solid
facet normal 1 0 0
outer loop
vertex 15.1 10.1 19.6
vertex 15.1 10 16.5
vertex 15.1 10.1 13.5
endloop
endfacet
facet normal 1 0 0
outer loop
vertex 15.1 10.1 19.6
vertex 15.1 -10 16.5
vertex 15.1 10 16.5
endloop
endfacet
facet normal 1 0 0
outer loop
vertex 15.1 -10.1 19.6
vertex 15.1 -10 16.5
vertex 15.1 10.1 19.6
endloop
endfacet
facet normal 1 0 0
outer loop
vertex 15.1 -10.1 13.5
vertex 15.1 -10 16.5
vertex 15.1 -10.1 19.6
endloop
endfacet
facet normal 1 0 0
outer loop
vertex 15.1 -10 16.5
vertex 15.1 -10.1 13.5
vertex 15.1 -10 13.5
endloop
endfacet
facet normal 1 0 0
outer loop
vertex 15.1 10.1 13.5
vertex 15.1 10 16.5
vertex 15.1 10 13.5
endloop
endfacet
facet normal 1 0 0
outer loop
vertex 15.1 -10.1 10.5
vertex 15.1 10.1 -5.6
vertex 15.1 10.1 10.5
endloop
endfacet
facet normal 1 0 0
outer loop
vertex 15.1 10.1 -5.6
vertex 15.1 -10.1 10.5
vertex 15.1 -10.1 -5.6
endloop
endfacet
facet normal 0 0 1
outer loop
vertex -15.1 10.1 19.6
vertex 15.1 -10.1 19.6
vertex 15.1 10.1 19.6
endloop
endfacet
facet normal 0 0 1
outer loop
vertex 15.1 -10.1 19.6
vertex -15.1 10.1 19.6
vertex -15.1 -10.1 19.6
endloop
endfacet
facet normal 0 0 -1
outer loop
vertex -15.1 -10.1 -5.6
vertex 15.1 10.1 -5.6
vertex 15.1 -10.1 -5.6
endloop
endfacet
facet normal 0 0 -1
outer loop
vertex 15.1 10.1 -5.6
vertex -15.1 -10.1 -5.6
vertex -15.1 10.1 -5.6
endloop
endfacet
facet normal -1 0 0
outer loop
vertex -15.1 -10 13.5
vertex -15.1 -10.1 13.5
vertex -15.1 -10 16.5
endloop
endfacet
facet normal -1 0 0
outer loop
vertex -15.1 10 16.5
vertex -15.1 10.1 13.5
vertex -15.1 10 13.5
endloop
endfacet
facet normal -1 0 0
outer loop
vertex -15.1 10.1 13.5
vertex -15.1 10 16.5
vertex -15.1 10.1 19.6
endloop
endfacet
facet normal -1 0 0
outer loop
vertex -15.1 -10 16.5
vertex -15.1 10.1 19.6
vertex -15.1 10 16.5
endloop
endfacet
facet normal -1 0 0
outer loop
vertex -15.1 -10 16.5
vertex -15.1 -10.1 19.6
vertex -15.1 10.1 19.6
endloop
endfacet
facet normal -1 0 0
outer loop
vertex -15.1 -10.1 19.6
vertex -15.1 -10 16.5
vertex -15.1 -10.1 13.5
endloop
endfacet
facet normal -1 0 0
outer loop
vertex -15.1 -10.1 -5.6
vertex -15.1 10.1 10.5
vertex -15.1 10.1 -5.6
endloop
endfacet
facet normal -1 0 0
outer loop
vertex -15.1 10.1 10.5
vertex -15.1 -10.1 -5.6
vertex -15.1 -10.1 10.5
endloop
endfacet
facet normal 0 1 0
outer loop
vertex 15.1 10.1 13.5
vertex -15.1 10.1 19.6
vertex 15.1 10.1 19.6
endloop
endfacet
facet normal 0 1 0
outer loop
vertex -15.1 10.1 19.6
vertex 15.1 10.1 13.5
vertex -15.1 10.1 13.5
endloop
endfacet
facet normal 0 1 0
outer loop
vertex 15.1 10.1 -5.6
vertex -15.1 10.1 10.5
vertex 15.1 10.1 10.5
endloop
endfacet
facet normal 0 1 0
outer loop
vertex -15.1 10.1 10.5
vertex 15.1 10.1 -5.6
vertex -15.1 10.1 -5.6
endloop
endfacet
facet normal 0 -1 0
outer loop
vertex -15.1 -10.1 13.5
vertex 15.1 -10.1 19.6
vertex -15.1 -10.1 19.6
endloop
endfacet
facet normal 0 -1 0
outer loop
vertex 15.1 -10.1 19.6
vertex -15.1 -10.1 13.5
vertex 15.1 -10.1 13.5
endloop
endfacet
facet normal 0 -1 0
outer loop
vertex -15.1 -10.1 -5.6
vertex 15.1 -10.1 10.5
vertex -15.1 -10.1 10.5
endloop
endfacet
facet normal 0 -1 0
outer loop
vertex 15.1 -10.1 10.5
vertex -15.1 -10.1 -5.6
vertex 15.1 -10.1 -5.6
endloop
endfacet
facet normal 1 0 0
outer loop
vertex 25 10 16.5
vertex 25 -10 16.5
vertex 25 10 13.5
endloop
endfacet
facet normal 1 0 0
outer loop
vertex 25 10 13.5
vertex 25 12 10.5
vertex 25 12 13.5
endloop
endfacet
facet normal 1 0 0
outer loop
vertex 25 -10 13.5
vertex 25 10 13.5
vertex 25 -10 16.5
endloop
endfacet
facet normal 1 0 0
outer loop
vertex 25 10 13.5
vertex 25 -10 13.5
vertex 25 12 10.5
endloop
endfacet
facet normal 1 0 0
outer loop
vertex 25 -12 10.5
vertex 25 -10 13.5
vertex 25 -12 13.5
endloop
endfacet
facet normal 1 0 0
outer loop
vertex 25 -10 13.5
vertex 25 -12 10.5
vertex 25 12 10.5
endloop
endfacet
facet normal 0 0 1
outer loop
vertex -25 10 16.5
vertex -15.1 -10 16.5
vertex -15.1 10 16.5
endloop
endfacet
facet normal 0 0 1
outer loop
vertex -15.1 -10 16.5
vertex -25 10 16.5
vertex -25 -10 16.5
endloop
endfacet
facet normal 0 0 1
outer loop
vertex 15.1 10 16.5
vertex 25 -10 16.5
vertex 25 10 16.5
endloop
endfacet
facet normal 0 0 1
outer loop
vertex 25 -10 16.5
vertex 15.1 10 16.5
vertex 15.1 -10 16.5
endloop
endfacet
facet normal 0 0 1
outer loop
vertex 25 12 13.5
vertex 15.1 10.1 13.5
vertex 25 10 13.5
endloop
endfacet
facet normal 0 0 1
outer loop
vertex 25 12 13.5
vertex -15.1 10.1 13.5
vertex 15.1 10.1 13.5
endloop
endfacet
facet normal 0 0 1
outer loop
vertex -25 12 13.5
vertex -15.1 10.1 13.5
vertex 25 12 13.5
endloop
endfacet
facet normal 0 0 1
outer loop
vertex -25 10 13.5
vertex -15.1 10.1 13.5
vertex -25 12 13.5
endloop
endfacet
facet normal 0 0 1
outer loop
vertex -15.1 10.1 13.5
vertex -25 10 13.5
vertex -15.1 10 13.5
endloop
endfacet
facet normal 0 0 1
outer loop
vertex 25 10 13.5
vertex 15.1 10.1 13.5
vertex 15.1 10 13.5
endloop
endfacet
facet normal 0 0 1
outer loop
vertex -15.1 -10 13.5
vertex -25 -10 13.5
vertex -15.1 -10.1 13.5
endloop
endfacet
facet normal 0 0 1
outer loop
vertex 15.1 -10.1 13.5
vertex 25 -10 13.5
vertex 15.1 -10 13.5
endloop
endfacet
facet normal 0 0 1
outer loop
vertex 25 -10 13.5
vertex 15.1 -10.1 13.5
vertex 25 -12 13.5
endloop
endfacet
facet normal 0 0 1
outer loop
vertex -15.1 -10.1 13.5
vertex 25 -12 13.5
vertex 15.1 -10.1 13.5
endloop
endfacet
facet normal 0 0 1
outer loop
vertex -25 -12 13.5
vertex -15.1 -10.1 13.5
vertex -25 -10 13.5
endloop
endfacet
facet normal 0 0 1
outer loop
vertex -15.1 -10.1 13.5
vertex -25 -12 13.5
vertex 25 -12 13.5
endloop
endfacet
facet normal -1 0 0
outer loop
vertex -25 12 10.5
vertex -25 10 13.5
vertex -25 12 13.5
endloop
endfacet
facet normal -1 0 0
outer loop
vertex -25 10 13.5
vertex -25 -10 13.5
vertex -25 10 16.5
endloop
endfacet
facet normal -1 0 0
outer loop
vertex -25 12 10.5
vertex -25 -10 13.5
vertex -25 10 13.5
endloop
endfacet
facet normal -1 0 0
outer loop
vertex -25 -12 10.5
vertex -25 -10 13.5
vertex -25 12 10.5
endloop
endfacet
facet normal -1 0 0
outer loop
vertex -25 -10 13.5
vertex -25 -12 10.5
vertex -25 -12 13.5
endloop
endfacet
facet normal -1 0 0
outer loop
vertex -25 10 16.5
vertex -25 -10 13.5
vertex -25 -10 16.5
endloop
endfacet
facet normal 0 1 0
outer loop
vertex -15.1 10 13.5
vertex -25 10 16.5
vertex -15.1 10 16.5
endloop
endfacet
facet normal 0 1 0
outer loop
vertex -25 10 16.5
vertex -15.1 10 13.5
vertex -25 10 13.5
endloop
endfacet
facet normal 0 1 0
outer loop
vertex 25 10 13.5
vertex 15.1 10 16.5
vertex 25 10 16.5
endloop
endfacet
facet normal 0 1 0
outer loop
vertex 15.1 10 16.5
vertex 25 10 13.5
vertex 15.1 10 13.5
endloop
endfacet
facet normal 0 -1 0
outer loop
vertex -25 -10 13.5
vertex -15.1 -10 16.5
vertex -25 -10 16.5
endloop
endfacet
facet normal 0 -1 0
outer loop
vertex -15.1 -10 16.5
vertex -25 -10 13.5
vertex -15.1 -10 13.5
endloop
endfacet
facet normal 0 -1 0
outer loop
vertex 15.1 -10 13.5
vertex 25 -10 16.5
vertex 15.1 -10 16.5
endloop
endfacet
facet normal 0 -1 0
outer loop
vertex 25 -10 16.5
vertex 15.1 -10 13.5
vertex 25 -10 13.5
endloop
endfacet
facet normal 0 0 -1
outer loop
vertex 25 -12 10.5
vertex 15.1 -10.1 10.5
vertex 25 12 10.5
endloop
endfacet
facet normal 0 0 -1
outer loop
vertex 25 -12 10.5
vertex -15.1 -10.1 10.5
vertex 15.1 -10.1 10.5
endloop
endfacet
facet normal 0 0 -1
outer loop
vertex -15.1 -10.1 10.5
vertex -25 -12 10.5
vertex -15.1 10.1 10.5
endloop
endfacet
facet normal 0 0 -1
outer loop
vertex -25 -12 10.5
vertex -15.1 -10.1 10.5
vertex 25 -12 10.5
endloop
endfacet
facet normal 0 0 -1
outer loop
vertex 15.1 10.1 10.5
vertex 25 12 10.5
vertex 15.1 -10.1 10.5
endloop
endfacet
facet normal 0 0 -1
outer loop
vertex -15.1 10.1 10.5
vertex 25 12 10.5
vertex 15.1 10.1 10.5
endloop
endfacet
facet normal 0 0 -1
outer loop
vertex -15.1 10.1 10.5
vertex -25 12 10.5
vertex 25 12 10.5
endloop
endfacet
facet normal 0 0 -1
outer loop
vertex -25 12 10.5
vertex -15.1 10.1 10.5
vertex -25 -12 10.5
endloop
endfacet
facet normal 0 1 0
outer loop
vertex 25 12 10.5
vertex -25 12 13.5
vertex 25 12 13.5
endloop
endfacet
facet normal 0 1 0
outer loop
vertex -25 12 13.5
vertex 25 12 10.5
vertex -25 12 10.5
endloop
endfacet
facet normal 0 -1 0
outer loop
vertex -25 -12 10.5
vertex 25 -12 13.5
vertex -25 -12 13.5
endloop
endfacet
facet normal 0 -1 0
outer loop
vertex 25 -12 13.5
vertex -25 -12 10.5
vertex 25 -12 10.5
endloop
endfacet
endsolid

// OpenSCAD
servo_l = 30;
servo_w = 20;
servo_h = 25;


tol = 0.1;
wall_t = 2;


%cube([servo_l+2*wall_t,servo_w+2*wall_t,servo_h-4],center=true);

translate([0,0,servo_h/2-2.5+wall_t]){
cube([servo_l+20,servo_w+2*wall_t,3],center=true);
}//end translate

translate([0,0,wall_t+5]){
cube([servo_l+2*tol,servo_w+2*tol,servo_h+2*tol],center=true);


translate([0,0,8]){
cube([servo_l+20,servo_w,3],center=true);
}//end translate
}//end translate
